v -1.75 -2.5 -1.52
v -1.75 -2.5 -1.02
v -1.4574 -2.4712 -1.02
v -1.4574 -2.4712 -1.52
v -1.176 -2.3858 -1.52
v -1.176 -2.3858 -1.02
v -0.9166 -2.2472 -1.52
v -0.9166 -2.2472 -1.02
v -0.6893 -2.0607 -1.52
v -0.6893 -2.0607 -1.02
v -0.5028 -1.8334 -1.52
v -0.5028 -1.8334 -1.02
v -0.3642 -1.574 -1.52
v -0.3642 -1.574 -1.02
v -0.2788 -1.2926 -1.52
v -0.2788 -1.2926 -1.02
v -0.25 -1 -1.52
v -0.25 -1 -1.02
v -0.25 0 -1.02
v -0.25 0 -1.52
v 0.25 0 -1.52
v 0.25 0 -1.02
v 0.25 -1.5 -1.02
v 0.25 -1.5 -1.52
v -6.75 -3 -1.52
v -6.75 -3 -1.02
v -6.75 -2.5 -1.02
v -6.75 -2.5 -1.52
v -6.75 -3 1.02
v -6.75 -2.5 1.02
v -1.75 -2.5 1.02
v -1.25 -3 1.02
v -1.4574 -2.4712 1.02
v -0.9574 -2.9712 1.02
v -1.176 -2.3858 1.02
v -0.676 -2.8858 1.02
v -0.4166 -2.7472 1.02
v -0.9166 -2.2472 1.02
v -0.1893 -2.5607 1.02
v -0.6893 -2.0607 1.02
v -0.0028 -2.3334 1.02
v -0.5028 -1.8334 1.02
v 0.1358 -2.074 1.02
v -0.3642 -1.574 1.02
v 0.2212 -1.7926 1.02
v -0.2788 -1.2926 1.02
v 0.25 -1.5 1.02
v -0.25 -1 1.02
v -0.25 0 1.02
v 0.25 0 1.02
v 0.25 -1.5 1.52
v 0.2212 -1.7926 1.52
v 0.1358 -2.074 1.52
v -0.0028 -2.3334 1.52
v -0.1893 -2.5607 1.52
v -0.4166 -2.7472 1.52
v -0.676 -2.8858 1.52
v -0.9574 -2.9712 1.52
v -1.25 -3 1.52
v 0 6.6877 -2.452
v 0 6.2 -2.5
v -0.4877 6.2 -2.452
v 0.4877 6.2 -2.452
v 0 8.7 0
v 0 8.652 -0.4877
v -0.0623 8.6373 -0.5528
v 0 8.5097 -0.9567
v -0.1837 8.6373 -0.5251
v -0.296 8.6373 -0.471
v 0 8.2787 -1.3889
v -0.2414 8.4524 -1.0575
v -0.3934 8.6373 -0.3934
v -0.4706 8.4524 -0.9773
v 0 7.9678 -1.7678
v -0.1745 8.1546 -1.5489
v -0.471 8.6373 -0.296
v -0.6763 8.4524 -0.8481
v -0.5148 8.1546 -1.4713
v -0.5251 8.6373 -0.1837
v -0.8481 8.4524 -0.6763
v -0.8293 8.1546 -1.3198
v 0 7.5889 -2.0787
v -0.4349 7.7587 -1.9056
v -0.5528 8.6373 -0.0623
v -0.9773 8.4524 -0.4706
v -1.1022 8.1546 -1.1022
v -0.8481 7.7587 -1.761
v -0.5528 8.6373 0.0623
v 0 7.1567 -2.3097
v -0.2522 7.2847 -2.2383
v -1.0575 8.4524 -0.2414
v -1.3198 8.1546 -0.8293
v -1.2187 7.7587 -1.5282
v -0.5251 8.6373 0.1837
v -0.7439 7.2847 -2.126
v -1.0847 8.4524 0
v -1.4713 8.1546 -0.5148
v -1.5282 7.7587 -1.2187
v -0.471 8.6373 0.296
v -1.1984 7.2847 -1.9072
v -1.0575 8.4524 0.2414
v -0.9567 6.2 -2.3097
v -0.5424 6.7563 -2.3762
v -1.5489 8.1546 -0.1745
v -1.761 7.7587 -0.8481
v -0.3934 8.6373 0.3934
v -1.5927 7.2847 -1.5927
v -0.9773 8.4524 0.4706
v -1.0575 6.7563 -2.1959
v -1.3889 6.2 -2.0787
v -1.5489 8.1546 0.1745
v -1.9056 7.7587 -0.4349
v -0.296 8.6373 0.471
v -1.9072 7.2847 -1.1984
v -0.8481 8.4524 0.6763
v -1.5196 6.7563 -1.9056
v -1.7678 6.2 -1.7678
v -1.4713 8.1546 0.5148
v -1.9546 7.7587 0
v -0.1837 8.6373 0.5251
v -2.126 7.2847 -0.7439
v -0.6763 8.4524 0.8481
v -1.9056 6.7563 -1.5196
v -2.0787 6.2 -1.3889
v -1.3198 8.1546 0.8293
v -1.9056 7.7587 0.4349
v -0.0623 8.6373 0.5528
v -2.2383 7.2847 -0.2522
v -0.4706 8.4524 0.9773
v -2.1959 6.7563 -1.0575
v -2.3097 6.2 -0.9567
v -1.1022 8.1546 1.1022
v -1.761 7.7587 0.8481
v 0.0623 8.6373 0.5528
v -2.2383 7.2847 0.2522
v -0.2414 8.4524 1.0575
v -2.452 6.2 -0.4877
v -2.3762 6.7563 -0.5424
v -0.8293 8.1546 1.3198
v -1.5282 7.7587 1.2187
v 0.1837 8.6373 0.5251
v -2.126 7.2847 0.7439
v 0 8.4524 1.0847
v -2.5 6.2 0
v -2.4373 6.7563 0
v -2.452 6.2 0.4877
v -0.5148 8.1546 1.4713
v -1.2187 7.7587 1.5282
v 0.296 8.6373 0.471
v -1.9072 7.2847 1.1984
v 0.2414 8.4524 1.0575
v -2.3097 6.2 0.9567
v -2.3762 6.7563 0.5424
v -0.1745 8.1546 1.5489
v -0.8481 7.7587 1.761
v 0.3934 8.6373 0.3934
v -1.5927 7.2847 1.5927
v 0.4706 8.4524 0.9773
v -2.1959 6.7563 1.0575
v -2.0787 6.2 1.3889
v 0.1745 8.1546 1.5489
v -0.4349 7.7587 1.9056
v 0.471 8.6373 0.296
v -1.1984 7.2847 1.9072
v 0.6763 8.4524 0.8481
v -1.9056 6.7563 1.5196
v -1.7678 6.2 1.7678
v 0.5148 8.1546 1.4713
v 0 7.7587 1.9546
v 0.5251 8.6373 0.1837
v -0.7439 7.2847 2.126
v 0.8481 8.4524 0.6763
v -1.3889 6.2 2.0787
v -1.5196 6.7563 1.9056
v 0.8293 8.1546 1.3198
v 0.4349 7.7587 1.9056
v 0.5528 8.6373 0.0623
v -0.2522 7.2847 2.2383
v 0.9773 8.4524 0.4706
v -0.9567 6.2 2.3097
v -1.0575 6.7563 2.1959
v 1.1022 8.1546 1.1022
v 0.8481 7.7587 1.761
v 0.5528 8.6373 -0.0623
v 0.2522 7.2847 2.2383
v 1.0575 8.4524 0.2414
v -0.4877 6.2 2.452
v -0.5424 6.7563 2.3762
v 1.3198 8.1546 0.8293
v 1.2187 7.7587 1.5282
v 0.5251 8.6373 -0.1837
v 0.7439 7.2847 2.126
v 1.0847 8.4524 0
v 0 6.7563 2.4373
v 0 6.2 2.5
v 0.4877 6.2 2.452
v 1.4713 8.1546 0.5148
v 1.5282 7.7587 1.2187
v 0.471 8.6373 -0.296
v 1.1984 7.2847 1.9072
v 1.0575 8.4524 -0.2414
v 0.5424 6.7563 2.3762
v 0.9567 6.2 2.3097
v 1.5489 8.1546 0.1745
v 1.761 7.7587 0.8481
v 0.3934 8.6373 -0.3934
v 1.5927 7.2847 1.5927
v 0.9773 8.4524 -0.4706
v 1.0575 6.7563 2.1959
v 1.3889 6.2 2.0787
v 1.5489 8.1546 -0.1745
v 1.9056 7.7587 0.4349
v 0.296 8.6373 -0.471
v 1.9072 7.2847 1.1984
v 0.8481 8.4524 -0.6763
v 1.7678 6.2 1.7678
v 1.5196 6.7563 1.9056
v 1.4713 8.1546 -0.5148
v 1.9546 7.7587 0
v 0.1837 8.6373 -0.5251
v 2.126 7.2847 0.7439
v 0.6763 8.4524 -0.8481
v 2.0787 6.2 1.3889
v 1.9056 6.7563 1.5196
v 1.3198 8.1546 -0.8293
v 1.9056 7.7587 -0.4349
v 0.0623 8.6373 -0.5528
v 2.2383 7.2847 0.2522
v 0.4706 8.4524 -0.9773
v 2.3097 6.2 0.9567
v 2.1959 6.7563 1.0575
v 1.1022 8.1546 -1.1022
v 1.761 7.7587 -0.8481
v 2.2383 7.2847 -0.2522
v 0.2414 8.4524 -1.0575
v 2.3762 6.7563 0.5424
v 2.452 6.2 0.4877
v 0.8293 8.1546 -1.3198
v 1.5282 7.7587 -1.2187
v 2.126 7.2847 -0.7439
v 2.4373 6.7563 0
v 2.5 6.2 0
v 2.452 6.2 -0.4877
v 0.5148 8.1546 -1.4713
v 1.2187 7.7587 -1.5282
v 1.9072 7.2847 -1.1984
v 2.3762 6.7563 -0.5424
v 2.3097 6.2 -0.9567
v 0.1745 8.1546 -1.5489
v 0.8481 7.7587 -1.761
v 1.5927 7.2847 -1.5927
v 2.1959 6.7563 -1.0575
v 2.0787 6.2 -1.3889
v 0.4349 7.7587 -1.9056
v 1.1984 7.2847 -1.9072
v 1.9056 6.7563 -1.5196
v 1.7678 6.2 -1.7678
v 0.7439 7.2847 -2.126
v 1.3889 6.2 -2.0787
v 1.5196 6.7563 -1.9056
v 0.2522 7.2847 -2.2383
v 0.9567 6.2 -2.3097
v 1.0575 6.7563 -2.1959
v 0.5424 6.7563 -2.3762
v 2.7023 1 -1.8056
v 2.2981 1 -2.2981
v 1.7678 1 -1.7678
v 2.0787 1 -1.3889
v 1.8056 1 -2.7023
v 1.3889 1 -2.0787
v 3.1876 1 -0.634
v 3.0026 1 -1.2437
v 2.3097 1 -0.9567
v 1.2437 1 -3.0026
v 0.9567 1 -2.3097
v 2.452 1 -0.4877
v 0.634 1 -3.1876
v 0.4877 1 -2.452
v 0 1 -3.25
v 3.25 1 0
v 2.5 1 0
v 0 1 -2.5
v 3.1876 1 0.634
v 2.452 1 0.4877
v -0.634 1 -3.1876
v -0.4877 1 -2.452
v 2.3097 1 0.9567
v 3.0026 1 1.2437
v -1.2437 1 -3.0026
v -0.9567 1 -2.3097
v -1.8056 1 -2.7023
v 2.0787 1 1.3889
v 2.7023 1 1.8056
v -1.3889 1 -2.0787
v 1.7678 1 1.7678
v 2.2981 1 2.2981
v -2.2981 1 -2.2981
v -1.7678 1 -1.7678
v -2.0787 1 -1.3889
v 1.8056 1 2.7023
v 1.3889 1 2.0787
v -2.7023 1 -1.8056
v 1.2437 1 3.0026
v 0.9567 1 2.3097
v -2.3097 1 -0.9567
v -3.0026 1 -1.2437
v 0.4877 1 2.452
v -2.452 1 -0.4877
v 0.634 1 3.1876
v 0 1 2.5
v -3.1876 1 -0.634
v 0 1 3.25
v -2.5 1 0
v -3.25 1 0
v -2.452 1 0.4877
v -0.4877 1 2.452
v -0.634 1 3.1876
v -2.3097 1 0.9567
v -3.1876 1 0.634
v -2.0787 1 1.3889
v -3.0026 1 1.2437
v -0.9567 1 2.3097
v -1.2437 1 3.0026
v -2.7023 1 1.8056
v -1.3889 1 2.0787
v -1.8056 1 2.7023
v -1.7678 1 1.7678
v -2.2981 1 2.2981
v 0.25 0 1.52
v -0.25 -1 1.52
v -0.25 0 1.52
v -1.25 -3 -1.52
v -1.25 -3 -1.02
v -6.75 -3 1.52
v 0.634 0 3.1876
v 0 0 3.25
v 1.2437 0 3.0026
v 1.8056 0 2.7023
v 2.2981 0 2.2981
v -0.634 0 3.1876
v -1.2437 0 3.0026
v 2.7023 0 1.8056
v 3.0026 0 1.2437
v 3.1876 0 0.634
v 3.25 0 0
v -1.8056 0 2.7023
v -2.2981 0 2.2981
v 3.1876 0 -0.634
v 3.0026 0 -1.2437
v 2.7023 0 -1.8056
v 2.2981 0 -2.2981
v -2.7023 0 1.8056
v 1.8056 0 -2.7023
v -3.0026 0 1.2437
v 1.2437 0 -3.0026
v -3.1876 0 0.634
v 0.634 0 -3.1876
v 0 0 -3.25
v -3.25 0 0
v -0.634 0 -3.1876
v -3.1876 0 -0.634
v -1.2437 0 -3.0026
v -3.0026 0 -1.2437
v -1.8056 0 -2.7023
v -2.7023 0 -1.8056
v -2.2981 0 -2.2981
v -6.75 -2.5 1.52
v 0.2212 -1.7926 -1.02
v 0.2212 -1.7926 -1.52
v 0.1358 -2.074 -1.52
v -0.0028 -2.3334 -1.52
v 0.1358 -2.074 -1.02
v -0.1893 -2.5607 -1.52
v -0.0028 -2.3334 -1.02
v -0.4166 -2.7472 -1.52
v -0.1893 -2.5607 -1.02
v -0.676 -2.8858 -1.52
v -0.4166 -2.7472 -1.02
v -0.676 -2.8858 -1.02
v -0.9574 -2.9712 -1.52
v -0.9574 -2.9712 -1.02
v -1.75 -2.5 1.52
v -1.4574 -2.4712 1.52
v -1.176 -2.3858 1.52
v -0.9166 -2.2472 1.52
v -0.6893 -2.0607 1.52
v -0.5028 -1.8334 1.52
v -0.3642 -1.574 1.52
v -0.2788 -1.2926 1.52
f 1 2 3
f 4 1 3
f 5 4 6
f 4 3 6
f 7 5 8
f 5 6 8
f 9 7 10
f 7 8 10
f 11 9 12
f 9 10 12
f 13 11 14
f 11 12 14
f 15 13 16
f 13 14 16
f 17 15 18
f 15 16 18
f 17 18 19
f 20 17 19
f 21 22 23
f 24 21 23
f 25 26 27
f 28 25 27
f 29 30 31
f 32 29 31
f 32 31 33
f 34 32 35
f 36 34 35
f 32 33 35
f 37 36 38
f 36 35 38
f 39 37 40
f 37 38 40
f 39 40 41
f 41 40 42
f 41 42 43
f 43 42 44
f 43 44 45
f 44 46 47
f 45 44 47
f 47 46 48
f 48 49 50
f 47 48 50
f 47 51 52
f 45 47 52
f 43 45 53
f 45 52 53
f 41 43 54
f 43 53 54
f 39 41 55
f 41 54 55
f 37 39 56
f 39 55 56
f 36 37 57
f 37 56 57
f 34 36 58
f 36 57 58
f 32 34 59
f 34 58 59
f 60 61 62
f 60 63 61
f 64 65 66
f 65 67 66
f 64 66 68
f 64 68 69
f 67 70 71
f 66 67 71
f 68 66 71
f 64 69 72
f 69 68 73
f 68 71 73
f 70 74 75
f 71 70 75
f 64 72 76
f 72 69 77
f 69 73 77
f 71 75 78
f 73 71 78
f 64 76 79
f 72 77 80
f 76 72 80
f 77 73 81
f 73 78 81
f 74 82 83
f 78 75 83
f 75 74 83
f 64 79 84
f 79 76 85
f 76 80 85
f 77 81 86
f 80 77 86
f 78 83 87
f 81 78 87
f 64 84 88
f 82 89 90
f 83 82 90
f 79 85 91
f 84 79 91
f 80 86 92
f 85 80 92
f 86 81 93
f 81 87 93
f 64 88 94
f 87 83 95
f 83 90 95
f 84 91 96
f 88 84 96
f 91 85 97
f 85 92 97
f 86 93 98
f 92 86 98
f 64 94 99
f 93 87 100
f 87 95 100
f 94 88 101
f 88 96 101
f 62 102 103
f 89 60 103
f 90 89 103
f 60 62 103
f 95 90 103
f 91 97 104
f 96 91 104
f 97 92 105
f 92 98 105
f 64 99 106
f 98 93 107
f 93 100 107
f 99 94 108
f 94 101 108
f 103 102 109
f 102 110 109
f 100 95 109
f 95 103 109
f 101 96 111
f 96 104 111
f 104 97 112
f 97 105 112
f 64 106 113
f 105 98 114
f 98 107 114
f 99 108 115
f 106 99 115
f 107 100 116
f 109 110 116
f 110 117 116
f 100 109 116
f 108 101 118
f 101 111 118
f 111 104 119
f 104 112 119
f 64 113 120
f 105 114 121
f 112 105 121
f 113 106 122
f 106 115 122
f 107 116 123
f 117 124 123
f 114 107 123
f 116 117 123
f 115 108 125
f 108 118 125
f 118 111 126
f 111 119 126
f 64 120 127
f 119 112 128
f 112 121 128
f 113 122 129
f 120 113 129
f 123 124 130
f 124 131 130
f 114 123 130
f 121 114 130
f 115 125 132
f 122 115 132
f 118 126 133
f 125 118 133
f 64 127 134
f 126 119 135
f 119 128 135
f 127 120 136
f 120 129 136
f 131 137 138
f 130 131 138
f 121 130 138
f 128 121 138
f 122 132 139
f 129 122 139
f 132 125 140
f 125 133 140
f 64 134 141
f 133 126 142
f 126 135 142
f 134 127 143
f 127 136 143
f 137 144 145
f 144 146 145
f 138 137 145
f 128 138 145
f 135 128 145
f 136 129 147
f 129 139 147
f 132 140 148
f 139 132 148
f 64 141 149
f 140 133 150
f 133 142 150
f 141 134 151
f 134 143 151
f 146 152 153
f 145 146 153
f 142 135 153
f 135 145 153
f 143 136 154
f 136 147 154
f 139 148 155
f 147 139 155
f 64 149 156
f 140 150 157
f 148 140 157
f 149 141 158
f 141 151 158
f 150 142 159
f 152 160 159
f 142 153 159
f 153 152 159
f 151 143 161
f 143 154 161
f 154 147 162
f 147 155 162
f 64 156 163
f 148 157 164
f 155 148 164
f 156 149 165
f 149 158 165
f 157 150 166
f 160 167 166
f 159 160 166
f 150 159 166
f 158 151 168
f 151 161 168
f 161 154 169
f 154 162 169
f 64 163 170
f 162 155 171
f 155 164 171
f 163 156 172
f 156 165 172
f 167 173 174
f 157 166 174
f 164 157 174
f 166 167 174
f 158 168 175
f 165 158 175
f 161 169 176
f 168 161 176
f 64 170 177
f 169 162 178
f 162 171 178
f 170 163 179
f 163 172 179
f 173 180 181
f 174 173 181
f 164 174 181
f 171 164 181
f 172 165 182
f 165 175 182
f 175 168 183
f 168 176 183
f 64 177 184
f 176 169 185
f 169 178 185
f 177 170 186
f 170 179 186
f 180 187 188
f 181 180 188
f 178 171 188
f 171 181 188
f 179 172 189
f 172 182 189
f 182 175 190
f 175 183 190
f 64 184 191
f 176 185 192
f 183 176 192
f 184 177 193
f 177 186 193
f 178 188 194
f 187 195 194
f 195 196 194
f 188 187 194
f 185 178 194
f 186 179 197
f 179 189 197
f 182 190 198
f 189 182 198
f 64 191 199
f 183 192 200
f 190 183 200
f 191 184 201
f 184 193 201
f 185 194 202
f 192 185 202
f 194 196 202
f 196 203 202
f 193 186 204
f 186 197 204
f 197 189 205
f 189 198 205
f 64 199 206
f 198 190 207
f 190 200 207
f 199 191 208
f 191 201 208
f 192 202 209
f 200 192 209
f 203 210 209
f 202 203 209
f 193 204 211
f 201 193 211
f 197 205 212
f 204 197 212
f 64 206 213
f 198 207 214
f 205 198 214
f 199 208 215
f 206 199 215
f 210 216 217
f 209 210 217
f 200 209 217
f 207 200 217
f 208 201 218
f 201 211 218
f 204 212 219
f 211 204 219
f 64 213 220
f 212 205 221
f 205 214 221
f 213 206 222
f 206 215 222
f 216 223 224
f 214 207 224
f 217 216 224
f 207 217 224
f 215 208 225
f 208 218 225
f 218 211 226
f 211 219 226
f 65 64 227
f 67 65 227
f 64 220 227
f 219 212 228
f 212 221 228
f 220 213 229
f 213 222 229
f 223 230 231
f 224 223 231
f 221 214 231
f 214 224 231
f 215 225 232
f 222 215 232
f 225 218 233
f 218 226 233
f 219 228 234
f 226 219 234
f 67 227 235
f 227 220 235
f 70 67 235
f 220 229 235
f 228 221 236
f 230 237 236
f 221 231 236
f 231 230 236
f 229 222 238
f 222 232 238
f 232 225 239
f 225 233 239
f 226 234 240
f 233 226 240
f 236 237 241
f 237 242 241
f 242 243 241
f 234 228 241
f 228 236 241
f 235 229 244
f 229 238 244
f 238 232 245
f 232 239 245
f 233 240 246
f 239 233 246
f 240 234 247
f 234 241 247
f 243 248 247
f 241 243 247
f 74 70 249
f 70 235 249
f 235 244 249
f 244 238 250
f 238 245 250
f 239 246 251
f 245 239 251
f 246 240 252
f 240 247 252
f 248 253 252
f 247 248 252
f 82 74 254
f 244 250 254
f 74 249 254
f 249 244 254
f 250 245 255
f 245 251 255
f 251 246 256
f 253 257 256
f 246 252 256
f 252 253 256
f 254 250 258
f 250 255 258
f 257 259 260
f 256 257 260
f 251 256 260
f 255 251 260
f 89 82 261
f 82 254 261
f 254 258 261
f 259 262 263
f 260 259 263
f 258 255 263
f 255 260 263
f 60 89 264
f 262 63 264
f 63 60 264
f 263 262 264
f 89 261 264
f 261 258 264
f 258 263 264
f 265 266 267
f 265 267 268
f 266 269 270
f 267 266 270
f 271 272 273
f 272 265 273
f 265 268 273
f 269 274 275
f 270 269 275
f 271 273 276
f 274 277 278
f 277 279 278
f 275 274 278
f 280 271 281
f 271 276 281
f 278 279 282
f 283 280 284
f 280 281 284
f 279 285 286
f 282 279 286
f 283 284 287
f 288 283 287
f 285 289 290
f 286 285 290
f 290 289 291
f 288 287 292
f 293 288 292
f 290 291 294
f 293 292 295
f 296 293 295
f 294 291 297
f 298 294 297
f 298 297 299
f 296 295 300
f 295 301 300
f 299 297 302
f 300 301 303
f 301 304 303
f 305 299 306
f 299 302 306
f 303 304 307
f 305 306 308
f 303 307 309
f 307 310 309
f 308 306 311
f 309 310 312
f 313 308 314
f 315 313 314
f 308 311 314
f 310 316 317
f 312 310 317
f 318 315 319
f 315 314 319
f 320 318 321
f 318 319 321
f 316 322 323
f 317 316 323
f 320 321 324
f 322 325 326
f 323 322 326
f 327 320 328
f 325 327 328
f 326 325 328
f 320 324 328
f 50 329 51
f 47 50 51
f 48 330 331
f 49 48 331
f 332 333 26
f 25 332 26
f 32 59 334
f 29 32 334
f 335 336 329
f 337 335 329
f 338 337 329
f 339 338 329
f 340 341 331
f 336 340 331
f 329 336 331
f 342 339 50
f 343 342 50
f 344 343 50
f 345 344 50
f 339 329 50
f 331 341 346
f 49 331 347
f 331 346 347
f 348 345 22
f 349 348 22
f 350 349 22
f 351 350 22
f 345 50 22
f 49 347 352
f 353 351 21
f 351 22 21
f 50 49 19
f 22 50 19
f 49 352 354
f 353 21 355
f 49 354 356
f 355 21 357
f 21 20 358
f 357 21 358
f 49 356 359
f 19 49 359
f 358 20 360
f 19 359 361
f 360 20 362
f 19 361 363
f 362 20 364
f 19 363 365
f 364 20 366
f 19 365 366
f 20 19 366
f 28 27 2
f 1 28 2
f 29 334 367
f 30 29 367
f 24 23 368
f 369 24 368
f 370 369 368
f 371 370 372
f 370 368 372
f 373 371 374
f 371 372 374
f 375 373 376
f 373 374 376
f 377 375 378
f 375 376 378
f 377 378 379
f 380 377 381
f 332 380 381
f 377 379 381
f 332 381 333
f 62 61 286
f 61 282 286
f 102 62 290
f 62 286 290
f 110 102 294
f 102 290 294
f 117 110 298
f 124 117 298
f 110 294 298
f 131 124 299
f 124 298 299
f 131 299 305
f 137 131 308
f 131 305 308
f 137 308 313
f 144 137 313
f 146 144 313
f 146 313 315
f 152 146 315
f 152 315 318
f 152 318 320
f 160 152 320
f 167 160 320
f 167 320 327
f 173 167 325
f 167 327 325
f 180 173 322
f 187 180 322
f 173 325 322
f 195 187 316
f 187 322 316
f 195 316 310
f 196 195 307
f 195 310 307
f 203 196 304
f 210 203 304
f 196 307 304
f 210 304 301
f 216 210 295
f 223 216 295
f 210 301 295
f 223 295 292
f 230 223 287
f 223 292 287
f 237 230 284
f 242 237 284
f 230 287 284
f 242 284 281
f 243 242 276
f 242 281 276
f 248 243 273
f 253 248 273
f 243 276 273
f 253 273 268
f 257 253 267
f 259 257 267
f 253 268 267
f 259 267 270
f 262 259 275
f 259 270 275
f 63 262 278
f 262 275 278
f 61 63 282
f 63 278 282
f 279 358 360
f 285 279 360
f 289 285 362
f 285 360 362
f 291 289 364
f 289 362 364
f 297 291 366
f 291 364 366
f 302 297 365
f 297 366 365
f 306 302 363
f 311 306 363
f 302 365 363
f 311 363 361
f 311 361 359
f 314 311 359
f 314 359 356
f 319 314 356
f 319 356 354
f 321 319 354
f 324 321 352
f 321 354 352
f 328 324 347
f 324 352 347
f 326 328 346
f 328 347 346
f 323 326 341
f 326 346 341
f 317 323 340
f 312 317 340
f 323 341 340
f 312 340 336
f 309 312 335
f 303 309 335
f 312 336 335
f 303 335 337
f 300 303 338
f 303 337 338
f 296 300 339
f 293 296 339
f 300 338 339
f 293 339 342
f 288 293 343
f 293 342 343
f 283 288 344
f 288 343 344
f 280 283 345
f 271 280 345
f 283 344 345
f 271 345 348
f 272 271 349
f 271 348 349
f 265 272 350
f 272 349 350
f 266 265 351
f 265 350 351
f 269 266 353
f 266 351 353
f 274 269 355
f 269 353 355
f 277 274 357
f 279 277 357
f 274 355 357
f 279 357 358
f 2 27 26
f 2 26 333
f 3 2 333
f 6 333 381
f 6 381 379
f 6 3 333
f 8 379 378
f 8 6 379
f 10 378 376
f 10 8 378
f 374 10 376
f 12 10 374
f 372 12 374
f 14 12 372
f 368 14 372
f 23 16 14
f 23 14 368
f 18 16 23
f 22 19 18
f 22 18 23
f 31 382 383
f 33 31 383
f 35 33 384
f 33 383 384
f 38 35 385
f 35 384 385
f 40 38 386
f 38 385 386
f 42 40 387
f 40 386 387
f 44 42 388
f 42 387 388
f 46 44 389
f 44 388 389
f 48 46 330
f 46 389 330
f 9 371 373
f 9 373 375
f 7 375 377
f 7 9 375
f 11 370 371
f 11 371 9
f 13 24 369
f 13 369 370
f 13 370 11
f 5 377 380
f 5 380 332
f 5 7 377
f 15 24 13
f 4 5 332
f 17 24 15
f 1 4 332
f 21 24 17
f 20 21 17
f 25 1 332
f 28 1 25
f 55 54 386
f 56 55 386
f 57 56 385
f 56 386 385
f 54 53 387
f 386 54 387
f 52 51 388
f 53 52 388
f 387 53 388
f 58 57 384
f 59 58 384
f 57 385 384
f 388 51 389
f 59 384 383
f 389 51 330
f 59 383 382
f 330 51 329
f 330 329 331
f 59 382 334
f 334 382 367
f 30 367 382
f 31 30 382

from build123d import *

# Parameters (mm, degrees)
EXTRUDE_1_DEPTH         = 1.52
CUT_EXTRUDE_START       = -3
CUT_EXTRUDE_1_OUTLINE_W = 7
CUT_EXTRUDE_1_OUTLINE_H = 2.04
CUT_EXTRUDE_1_DEPTH     = 3


# Read off the part's stored shape, not the designer's step: Вырез-Вытянуть1
with BuildPart() as part:
    # Эскиз1 → Повернуть1 (revolve)
    with BuildSketch(Plane(origin=(0, 0, 0), x_dir=(0, 0, -1), z_dir=(1, 0, 0)), mode=Mode.PRIVATE) as revolve_1_sk:
        with BuildLine():
            Line((-2.5, 1), (0, 1))
            Line((0, 1), (0, 8.7))
            ThreePointArc((0, 8.7), (-1.767766953, 7.967766953), (-2.5, 6.2))
            Line((-2.5, 6.2), (-2.5, 1))
        make_face()
        Polygon((-3.25, 1), (-3.25, 0), (0, 0), (0, 1), (-2.5, 1), align=None)
    revolve(revolve_1_sk.sketch.rotate(Axis((0, -2.603301624, 0), (0, 1, 0)), 180), axis=Axis((0, -2.603301624, 0), (0, 1, 0)))

    # Эскиз2 → Бобышка-Вытянуть1 (add, symmetric)
    with BuildSketch(Plane.XY):
        with BuildLine():
            Line((0.25, 0), (0.25, -1.5))
            ThreePointArc((0.25, -1.5), (-0.189339828, -2.560660172), (-1.25, -3))
            Line((-1.25, -3), (-6.75, -3))
            Line((-6.75, -3), (-6.75, -2.5))
            Line((-6.75, -2.5), (-1.75, -2.5))
            ThreePointArc((-1.75, -2.5), (-0.689339828, -2.060660172), (-0.25, -1))
            Line((-0.25, -1), (-0.25, 0))
            Line((-0.25, 0), (0.25, 0))
        make_face()
    extrude(amount=EXTRUDE_1_DEPTH, both=True)

    # Вырез-Вытянуть1 outline → Вырез-Вытянуть1 (cut)
    with BuildSketch(Plane.XZ.offset(3).offset(CUT_EXTRUDE_START)):
        with Locations((-3.25, 0)):
            Rectangle(CUT_EXTRUDE_1_OUTLINE_W, CUT_EXTRUDE_1_OUTLINE_H)
    extrude(amount=CUT_EXTRUDE_1_DEPTH, mode=Mode.SUBTRACT)


solid = part.part
